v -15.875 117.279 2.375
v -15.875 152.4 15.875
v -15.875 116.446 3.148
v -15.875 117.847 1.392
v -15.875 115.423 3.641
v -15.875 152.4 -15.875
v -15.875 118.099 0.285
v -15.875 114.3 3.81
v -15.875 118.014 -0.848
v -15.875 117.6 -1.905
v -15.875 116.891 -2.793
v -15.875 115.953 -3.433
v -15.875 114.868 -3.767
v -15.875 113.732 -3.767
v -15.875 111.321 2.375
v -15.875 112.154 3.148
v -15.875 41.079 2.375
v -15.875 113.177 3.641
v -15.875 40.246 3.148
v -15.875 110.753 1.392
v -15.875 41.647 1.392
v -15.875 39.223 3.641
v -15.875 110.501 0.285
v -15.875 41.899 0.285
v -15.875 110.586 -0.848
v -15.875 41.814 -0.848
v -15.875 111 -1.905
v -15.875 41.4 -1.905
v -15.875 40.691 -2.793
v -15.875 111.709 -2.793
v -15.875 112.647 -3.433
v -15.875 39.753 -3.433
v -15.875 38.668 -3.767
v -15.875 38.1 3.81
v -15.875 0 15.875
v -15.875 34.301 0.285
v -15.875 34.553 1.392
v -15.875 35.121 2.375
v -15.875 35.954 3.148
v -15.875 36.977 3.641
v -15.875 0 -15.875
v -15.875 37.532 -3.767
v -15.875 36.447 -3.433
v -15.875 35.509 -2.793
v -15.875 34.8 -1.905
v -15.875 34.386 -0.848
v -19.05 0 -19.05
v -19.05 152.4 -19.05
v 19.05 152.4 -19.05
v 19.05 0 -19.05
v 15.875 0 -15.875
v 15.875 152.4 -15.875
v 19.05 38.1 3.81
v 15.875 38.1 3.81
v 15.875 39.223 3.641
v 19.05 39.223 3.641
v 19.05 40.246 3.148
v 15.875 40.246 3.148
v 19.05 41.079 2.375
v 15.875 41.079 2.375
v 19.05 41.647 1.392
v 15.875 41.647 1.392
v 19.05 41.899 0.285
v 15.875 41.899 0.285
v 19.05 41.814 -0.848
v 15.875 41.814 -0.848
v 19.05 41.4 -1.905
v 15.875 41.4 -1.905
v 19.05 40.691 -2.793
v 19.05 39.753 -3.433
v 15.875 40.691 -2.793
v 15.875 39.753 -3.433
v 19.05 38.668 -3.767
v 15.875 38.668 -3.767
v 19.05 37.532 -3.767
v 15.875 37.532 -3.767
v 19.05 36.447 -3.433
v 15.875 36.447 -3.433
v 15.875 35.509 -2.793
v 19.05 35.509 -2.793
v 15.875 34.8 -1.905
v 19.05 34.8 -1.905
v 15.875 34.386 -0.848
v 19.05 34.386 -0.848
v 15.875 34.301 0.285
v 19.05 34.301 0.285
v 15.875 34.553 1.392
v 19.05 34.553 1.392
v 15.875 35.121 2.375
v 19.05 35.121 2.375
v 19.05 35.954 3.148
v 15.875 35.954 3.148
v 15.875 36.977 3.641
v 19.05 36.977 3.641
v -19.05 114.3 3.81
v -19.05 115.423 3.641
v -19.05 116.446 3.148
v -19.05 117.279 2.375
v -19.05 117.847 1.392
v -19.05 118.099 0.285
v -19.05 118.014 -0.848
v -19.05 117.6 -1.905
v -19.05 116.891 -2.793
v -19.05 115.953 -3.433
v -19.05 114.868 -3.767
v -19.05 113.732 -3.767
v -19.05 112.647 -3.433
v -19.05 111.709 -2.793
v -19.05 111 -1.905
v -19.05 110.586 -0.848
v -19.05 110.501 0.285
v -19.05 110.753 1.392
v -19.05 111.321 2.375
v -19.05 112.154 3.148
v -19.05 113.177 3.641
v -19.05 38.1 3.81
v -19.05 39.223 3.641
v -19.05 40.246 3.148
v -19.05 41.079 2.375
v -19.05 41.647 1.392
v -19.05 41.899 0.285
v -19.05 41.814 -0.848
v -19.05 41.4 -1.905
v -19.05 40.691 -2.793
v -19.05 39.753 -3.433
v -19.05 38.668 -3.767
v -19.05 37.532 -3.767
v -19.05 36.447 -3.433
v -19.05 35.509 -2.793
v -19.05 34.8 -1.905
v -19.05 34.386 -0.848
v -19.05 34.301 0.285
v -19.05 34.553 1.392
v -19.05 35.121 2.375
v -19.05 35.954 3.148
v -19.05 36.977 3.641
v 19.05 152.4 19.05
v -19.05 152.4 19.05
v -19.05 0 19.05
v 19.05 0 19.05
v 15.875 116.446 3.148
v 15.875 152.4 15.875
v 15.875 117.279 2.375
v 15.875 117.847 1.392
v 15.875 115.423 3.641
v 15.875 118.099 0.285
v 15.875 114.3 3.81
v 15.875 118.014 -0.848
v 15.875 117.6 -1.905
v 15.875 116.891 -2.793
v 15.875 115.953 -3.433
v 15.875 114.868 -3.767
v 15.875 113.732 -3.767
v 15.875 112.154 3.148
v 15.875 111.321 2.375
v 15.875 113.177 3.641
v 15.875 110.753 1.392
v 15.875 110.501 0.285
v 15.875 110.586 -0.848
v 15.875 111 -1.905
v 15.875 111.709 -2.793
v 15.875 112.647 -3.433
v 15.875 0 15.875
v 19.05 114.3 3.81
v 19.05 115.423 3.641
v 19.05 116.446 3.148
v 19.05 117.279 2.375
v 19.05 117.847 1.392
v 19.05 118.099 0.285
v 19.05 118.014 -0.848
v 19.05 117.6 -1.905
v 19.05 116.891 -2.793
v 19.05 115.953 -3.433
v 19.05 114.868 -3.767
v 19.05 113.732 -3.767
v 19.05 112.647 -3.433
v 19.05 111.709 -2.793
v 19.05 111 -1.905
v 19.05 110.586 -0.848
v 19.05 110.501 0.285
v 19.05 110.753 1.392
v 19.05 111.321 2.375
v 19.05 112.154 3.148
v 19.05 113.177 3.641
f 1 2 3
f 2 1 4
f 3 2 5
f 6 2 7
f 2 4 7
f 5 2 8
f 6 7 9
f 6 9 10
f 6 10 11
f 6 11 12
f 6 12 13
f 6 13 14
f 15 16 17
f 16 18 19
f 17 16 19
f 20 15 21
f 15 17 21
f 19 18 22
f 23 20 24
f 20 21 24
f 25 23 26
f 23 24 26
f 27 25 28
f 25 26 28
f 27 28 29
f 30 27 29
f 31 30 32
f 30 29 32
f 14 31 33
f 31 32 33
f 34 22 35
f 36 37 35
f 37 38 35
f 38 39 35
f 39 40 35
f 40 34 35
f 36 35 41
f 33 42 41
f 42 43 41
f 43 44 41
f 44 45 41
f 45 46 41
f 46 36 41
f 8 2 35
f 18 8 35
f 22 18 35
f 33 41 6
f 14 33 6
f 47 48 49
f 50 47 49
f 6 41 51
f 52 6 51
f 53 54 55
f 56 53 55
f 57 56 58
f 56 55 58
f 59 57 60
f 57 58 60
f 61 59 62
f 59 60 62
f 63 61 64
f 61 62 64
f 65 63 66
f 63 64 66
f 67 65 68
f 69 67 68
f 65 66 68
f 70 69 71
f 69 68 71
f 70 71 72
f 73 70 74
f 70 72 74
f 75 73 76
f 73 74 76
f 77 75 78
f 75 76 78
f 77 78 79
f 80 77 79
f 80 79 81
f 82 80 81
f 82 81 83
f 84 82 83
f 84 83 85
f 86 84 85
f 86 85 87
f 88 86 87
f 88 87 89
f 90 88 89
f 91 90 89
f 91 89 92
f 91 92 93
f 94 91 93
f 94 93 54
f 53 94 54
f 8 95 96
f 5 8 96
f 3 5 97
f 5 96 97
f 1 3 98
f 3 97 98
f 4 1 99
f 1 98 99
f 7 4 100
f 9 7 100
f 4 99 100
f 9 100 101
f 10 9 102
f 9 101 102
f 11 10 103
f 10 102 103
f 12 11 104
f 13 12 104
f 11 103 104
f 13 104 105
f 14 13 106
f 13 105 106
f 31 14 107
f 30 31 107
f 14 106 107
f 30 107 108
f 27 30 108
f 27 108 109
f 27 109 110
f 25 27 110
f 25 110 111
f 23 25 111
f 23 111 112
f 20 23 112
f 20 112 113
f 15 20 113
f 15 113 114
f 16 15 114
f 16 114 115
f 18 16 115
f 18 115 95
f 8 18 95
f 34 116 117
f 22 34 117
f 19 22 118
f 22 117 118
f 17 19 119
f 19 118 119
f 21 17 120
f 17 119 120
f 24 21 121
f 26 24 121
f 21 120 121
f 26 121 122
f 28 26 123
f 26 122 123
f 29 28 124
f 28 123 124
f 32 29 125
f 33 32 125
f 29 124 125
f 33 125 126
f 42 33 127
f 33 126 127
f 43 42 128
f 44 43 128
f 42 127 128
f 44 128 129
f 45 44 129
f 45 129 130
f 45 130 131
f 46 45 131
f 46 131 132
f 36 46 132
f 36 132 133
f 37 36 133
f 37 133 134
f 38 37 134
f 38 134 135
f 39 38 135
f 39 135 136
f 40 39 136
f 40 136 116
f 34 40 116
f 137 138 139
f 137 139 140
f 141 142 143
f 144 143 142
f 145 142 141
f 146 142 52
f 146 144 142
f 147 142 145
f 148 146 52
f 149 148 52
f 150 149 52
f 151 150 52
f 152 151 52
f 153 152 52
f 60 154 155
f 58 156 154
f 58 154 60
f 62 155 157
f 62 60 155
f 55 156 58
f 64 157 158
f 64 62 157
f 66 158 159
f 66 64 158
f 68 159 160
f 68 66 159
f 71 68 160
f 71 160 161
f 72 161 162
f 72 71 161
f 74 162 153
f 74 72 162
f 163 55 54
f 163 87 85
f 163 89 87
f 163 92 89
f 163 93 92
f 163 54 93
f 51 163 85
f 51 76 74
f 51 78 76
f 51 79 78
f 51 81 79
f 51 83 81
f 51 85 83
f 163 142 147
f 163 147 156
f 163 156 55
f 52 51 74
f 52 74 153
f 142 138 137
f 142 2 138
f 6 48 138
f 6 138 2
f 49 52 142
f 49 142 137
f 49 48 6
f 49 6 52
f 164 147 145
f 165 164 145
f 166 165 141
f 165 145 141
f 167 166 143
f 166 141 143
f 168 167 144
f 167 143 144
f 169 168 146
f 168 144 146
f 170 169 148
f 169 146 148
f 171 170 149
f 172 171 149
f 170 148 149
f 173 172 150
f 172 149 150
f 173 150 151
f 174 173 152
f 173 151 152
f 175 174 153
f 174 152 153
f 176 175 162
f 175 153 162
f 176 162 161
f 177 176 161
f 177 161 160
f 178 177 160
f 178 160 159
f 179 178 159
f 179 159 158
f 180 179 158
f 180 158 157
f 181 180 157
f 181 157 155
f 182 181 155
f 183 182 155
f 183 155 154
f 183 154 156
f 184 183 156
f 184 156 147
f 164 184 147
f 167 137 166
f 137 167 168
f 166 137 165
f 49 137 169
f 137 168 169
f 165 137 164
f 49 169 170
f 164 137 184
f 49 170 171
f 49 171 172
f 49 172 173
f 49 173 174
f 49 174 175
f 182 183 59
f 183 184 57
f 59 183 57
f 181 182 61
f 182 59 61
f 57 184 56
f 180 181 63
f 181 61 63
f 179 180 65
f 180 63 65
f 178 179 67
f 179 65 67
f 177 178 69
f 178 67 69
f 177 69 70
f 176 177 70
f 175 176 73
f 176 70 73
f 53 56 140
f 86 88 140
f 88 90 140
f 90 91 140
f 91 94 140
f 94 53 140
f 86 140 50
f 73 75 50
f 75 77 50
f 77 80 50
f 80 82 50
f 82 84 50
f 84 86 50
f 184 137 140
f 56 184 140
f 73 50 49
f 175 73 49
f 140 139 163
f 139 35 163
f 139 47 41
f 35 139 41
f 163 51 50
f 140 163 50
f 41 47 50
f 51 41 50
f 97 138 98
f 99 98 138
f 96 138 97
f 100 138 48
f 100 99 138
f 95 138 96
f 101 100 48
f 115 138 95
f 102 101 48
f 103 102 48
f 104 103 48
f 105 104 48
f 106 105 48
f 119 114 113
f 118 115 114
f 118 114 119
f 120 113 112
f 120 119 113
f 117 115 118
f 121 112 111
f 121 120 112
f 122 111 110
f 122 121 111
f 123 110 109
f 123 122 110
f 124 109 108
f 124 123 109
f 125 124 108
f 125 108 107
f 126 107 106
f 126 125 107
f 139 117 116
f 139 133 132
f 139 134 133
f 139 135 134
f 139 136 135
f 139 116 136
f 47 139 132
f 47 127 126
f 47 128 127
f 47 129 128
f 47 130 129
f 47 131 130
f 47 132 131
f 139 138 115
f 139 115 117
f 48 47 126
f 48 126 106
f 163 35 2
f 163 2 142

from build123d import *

# Parameters (mm, degrees)
SKETCH1_W           = 38.1
SKETCH1_H           = 38.1
SKETCH1_W_2         = 31.75
SKETCH1_H_2         = 31.75
BOSS_EXTRUDE1_DEPTH = 152.4
SKETCH2_R           = 3.81
CUT_EXTRUDE1_DEPTH  = 152.4


with BuildPart() as part:
    # Sketch1 → Boss-Extrude1 (new body)
    with BuildSketch(Plane(origin=(0, 0, 0), x_dir=(1, 0, 0), z_dir=(0, 1, 0))):
        Rectangle(SKETCH1_W, SKETCH1_H)
        Rectangle(SKETCH1_W_2, SKETCH1_H_2, mode=Mode.SUBTRACT)
    extrude(amount=BOSS_EXTRUDE1_DEPTH)

    # Sketch2 → Cut-Extrude1 (cut)
    with BuildSketch(Plane.ZY.offset(19.05)):
        with Locations((0, 114.3)):
            Circle(SKETCH2_R)
        with Locations((0, 38.1)):
            Circle(SKETCH2_R)
    extrude(amount=-CUT_EXTRUDE1_DEPTH, mode=Mode.SUBTRACT)


solid = part.part
